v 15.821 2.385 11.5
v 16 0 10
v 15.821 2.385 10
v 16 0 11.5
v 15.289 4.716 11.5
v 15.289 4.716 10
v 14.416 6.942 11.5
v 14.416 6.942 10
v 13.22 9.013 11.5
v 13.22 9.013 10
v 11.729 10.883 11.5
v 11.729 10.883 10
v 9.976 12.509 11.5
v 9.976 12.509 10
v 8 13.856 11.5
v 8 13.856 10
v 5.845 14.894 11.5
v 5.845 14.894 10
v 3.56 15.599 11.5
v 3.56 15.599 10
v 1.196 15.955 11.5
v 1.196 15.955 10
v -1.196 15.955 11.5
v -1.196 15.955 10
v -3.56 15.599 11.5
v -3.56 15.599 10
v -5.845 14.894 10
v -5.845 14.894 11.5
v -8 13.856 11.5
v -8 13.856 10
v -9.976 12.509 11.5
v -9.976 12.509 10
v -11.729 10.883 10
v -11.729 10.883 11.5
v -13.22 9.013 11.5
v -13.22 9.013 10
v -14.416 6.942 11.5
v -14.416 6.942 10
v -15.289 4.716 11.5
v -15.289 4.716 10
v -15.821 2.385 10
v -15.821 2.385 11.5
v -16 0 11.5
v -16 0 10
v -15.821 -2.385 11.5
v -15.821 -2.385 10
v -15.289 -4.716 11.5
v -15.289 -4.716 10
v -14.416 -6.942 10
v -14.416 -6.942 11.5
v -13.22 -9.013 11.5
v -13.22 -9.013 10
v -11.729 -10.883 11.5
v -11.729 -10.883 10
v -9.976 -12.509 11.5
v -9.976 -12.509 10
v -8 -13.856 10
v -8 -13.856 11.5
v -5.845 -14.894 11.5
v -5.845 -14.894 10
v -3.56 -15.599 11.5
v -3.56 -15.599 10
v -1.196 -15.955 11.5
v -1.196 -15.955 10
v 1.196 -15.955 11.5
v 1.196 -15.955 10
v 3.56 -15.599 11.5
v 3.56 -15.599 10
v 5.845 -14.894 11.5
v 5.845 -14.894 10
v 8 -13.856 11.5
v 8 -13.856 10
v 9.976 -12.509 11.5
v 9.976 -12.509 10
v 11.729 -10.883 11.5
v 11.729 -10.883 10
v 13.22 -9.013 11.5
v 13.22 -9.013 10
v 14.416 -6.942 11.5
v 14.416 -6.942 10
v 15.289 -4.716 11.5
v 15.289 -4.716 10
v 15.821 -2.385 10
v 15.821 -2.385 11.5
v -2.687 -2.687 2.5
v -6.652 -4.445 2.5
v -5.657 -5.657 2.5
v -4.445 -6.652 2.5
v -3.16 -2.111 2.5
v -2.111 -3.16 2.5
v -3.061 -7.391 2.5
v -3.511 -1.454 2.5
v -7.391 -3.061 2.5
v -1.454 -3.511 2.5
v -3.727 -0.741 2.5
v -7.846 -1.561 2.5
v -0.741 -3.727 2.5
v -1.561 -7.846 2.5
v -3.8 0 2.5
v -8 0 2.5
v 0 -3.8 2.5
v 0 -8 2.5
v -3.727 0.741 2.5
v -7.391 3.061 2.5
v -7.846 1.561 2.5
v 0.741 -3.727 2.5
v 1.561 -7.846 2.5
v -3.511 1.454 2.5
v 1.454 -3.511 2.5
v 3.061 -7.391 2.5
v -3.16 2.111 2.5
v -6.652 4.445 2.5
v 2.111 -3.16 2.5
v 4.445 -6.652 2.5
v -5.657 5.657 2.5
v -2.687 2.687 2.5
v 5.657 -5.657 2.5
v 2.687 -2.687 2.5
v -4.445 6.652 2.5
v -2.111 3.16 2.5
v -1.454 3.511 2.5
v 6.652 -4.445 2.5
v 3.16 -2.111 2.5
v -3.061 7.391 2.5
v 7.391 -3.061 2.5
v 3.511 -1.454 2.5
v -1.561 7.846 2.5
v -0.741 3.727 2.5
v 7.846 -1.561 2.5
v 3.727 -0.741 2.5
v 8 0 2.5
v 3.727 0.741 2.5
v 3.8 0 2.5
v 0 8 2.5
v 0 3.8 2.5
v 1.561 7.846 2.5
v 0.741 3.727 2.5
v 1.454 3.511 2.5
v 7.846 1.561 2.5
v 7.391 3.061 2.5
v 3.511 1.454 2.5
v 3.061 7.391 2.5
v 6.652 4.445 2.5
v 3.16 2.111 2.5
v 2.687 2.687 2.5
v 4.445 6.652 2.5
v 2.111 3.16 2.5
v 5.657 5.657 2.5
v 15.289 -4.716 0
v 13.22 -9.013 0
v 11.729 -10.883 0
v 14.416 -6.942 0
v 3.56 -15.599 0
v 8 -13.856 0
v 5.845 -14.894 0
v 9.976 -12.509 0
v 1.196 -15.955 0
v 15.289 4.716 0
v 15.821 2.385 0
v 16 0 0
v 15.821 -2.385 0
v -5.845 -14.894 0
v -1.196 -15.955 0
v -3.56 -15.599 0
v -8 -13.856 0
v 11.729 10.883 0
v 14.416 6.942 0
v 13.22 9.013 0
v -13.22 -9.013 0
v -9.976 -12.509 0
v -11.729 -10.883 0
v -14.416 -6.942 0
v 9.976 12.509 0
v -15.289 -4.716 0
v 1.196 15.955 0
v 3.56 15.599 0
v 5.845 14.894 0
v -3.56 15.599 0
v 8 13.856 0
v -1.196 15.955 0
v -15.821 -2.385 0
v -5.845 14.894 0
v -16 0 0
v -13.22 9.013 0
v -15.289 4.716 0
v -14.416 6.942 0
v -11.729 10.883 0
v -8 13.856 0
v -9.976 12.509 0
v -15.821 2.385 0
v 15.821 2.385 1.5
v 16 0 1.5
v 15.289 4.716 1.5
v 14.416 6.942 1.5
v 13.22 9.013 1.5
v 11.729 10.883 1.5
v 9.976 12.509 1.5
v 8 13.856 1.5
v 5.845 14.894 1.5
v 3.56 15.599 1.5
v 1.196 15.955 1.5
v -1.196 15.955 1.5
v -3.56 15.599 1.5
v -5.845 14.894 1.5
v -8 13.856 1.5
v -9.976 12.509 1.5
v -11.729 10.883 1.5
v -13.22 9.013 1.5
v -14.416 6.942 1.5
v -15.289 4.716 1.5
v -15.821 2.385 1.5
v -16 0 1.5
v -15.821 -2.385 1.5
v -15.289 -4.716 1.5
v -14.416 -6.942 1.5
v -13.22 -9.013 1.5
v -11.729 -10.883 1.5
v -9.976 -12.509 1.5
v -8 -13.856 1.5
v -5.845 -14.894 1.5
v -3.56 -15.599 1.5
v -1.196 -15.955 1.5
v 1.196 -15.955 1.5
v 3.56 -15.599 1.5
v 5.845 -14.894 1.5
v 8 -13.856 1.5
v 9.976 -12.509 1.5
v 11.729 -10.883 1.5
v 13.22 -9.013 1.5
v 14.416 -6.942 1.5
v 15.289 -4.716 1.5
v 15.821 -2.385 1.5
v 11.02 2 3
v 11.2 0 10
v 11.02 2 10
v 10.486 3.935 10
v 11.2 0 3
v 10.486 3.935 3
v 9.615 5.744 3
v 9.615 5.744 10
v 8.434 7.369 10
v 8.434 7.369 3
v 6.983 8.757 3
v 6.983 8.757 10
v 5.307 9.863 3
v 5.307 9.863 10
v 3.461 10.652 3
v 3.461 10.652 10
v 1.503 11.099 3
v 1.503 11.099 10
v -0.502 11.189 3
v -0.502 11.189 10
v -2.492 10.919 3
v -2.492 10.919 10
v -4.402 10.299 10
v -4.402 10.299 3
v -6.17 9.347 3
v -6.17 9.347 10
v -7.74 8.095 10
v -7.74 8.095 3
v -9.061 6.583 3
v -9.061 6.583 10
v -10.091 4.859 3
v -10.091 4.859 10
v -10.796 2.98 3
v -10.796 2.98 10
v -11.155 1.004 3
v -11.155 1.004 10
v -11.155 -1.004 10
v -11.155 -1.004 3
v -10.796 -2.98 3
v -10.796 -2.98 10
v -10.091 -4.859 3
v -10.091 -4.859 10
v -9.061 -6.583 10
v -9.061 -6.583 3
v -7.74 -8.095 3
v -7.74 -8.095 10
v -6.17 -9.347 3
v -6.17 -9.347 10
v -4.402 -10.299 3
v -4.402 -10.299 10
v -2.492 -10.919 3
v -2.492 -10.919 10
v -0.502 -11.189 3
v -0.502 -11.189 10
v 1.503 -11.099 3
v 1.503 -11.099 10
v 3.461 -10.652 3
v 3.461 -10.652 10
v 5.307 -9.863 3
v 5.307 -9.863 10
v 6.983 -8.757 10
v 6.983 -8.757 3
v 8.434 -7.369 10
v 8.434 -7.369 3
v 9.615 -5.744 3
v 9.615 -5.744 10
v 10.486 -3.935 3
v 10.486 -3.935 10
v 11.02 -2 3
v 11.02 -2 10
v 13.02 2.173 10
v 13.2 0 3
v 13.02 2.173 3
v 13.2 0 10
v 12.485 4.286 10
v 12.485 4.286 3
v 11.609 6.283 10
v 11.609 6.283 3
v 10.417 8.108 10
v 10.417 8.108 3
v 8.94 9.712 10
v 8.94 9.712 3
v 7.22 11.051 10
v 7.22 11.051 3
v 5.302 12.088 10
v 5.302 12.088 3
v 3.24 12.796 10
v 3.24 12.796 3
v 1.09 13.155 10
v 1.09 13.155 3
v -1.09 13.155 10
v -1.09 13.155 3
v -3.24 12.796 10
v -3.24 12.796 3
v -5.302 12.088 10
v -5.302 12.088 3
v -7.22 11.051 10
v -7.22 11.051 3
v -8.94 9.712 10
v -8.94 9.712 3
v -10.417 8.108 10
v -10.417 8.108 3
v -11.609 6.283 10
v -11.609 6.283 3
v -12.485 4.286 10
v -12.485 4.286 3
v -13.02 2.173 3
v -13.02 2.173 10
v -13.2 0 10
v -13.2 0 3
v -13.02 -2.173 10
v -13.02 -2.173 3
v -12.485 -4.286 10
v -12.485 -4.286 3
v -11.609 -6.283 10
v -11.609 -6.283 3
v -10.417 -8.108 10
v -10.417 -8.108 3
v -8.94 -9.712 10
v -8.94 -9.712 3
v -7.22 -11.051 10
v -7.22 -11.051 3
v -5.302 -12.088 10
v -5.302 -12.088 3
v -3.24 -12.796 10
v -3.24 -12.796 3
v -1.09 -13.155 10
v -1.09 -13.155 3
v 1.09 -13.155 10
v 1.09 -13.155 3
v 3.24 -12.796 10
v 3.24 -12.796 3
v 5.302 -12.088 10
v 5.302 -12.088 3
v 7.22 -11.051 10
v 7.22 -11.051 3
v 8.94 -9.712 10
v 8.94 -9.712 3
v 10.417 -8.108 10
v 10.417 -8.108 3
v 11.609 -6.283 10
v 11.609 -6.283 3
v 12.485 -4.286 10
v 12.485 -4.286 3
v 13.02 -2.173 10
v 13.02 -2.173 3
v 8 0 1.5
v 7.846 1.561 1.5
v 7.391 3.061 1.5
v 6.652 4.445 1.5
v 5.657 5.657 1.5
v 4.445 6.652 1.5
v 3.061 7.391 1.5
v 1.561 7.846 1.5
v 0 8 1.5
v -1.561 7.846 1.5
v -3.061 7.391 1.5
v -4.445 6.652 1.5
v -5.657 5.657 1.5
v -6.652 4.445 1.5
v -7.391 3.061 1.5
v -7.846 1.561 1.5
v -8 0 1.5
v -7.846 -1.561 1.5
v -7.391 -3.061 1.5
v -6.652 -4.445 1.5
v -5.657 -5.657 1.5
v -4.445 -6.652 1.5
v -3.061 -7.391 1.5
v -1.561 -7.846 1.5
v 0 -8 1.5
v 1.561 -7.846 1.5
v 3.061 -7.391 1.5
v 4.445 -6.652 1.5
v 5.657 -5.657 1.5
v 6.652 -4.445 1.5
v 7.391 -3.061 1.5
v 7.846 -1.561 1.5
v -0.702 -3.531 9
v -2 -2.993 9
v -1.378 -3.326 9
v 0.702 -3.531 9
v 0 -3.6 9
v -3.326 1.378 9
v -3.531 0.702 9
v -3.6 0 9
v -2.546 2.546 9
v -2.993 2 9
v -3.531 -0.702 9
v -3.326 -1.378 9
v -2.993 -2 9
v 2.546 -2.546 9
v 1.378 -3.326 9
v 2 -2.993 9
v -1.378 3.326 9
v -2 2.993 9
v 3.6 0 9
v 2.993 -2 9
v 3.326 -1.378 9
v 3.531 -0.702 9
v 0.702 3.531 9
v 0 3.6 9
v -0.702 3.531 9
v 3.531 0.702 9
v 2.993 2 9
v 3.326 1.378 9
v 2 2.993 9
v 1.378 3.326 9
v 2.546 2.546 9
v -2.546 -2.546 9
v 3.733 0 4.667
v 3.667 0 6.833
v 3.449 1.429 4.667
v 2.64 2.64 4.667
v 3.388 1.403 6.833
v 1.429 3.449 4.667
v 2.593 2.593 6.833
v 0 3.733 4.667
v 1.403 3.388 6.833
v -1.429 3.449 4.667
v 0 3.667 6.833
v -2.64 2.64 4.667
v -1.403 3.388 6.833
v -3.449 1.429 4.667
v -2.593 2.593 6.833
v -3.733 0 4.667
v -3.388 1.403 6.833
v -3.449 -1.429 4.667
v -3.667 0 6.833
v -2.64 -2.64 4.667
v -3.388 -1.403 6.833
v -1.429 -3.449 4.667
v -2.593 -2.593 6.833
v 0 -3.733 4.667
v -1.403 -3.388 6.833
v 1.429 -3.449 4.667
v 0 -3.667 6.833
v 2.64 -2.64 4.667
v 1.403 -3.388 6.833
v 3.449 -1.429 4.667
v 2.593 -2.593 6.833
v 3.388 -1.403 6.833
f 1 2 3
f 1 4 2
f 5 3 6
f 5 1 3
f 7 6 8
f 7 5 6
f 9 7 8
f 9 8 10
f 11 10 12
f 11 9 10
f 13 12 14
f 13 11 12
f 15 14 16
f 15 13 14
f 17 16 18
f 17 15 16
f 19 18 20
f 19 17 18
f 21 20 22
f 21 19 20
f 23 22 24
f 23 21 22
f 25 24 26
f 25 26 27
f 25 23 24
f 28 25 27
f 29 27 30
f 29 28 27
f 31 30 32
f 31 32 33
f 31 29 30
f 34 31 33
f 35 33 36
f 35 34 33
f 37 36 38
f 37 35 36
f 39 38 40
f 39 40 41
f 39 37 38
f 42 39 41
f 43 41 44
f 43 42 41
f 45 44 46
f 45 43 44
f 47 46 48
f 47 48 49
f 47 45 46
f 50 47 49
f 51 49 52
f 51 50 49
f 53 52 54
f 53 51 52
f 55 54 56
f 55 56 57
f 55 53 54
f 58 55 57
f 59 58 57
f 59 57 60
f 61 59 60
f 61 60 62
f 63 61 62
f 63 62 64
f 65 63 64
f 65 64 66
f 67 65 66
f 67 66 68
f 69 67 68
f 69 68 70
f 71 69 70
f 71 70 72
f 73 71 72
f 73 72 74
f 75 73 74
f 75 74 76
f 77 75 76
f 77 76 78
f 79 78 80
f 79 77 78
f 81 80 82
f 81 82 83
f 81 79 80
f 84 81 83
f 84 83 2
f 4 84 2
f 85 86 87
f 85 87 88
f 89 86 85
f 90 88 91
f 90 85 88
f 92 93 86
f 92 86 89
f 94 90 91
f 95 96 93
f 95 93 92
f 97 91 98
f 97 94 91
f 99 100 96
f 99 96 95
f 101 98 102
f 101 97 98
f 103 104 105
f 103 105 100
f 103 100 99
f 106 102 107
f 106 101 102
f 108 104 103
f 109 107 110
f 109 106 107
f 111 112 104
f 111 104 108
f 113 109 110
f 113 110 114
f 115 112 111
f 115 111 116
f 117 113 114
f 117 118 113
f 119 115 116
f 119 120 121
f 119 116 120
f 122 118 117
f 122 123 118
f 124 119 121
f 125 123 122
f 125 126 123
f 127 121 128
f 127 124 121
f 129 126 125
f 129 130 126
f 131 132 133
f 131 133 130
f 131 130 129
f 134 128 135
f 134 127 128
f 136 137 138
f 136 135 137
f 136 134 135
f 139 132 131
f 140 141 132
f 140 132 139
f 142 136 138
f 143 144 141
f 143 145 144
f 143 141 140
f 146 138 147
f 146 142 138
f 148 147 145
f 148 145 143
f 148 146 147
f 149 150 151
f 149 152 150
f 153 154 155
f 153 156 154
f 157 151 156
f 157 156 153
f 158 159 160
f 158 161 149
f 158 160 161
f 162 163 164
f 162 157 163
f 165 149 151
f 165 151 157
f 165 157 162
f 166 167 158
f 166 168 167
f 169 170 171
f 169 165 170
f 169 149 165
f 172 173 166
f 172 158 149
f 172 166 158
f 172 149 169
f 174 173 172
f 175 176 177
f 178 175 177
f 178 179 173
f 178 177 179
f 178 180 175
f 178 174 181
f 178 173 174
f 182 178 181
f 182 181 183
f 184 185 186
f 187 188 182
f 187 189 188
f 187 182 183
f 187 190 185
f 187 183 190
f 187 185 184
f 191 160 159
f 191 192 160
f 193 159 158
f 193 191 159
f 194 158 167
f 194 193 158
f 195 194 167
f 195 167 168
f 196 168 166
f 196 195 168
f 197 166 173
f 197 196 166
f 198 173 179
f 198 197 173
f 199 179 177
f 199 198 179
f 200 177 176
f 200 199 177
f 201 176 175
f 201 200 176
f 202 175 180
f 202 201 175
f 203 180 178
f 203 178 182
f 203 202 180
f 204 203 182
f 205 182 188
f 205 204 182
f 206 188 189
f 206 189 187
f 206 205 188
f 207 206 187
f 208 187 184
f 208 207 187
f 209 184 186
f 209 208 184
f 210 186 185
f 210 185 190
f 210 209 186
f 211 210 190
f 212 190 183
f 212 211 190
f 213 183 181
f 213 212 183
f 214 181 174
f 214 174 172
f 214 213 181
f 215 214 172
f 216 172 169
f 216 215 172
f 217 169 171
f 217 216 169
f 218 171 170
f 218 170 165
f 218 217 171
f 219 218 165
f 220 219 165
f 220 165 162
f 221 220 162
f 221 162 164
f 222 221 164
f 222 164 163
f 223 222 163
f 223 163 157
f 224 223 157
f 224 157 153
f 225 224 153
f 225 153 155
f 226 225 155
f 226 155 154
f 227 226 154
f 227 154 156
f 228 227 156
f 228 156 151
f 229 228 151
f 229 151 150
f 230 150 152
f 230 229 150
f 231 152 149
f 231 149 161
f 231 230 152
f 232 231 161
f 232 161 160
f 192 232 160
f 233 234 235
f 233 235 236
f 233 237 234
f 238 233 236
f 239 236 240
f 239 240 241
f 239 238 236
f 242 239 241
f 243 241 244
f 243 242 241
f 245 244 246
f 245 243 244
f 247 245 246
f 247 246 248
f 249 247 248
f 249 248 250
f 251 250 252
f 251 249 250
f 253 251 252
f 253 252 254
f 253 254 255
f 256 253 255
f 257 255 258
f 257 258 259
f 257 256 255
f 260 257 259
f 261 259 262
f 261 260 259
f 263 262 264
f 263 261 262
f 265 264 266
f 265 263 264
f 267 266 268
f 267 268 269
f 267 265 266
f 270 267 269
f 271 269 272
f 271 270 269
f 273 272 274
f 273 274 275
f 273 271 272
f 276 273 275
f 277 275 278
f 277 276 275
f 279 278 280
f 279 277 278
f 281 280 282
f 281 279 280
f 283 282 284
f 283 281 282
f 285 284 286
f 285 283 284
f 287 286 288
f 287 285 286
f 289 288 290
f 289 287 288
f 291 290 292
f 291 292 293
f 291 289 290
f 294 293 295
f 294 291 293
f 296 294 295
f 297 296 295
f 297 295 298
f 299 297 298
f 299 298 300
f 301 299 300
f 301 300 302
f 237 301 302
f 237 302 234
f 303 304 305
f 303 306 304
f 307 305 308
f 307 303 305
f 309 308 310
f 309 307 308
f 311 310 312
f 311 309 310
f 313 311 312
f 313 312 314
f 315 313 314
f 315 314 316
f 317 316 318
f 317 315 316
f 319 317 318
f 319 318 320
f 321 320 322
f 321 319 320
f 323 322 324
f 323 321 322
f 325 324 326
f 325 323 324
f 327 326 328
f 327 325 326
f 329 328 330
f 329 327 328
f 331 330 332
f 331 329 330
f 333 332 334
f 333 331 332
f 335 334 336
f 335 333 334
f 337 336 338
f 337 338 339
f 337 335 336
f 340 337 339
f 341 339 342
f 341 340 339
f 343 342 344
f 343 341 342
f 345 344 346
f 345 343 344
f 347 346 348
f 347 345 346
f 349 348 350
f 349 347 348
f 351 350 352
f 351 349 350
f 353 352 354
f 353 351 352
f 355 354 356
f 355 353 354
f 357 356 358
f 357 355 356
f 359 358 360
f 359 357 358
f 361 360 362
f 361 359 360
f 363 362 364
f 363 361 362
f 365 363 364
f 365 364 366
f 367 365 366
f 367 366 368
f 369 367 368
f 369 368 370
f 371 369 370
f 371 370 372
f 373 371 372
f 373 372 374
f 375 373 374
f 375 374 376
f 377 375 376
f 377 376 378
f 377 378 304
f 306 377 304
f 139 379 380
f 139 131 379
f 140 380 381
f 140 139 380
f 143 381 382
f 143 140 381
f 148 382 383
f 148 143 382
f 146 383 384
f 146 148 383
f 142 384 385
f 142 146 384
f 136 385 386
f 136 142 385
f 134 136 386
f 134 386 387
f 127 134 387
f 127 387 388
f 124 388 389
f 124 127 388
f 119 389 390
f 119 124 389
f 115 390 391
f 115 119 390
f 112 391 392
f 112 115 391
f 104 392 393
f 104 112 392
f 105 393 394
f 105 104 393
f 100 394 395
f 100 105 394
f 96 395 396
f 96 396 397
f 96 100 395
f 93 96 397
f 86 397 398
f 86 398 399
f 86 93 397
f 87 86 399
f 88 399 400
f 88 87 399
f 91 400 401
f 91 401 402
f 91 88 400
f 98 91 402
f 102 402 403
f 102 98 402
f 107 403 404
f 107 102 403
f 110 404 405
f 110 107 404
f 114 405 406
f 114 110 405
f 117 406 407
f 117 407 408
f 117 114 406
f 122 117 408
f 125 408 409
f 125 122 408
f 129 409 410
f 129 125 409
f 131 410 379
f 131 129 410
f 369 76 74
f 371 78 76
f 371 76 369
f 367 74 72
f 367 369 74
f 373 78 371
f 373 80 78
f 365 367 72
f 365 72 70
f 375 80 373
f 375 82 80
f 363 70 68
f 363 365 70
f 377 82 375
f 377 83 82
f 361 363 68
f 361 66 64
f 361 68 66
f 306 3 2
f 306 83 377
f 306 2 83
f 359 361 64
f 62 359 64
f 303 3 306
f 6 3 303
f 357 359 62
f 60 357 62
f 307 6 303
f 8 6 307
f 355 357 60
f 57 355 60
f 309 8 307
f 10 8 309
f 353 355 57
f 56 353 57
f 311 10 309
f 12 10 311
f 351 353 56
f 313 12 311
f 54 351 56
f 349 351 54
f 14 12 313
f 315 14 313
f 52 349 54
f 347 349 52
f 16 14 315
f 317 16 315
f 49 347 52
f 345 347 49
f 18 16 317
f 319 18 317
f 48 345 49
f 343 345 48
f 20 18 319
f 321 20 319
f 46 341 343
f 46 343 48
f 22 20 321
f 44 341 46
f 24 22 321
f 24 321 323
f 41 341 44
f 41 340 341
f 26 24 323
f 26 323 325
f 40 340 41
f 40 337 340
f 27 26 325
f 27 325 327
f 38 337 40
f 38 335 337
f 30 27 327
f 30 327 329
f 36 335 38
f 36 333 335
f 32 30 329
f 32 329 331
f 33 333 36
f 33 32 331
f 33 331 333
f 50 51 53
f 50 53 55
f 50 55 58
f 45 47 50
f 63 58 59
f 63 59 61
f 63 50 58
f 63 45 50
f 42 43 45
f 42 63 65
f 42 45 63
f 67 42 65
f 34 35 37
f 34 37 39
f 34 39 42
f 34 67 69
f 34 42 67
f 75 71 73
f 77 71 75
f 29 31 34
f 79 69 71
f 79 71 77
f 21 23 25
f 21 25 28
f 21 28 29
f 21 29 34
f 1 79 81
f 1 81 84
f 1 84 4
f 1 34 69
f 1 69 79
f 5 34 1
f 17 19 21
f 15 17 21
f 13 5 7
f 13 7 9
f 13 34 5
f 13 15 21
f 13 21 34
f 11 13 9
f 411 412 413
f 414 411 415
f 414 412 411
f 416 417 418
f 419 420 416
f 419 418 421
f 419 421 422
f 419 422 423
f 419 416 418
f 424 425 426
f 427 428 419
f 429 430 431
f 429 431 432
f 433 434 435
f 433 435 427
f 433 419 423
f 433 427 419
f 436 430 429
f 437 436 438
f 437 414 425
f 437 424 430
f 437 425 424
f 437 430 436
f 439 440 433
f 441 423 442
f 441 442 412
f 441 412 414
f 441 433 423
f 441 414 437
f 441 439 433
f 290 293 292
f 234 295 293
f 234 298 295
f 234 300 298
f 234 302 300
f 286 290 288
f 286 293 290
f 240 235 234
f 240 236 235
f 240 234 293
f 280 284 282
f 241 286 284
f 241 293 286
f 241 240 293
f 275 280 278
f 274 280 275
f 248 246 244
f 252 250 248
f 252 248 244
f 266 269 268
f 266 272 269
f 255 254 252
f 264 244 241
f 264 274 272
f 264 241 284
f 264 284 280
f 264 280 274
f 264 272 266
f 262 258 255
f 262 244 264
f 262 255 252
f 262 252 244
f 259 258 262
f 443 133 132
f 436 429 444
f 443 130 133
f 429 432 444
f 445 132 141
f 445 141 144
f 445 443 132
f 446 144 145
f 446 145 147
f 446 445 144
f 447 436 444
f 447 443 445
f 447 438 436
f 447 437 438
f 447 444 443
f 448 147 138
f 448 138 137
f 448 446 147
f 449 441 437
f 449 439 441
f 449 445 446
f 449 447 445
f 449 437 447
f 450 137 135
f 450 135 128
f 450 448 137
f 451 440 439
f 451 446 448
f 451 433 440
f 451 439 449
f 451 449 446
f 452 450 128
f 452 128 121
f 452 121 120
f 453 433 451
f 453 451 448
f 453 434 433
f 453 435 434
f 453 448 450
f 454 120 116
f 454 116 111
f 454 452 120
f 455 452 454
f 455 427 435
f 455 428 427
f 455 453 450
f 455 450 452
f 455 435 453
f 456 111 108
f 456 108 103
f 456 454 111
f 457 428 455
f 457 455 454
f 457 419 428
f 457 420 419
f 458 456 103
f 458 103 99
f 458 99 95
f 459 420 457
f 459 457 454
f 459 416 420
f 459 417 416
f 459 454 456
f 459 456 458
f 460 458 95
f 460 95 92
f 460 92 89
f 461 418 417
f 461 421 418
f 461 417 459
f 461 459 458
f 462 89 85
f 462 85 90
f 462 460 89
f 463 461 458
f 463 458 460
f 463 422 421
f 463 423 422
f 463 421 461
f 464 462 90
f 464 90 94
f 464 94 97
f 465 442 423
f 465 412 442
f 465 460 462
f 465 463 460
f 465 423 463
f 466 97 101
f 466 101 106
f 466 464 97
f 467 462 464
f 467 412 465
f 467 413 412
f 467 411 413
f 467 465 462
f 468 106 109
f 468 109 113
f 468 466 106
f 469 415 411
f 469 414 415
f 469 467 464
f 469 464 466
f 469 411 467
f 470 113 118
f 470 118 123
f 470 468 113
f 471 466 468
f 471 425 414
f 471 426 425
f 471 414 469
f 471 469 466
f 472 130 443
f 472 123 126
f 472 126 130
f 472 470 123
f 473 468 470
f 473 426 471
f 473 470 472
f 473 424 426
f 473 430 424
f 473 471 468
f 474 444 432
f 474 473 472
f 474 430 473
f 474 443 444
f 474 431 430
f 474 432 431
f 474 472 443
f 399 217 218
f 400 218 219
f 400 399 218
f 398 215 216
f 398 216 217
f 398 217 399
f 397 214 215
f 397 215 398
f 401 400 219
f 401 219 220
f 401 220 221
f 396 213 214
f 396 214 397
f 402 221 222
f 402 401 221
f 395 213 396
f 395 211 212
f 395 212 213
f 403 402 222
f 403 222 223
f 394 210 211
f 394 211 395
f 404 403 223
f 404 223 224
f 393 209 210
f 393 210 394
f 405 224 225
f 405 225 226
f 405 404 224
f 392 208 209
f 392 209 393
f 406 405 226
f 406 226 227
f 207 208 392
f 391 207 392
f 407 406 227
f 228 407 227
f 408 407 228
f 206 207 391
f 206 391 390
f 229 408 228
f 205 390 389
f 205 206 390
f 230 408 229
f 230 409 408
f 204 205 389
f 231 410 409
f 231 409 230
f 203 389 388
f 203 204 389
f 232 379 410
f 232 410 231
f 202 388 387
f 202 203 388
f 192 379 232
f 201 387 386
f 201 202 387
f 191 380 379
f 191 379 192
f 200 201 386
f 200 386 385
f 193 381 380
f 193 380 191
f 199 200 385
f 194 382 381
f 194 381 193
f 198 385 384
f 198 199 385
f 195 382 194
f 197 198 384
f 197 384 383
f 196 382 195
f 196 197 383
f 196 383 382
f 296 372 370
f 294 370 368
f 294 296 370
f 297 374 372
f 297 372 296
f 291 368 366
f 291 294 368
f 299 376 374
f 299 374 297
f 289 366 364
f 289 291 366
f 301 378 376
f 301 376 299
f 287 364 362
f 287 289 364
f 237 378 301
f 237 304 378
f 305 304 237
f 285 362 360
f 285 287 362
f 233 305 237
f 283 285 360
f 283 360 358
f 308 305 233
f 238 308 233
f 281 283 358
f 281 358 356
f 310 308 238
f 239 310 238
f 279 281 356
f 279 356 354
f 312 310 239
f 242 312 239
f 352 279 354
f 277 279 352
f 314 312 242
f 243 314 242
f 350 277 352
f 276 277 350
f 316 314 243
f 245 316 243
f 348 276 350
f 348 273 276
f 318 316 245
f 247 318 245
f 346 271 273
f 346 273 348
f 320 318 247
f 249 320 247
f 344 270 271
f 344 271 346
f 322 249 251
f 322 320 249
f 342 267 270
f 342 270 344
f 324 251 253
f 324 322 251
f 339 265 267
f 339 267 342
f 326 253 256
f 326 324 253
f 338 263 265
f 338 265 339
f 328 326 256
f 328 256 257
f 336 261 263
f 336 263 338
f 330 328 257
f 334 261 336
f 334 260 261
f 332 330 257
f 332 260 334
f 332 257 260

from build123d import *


with BuildPart() as f1:
    # F0 (on Front) → F1 (revolve)
    with BuildSketch(Plane.XZ):
        Polygon((0, 9), (0, 0), (16, 0), (16, 1.5), (8, 1.5), (8, 2.5), (3.8, 2.5), (3.6, 9), align=None)
    revolve(axis=Axis((0, 0, 4.5), (0, 0, 1)))


with BuildPart() as f3:
    # F2 (on Front) → F3 (revolve)
    with BuildSketch(Plane.XZ):
        Polygon((0, 11.5), (0, 10), (11.2, 10), (11.2, 3), (13.2, 3), (13.2, 10), (16, 10), (16, 11.5), align=None)
    revolve(axis=Axis((0, 0, 10.75), (0, 0, 1)))


solid = Compound([f1.part, f3.part])
